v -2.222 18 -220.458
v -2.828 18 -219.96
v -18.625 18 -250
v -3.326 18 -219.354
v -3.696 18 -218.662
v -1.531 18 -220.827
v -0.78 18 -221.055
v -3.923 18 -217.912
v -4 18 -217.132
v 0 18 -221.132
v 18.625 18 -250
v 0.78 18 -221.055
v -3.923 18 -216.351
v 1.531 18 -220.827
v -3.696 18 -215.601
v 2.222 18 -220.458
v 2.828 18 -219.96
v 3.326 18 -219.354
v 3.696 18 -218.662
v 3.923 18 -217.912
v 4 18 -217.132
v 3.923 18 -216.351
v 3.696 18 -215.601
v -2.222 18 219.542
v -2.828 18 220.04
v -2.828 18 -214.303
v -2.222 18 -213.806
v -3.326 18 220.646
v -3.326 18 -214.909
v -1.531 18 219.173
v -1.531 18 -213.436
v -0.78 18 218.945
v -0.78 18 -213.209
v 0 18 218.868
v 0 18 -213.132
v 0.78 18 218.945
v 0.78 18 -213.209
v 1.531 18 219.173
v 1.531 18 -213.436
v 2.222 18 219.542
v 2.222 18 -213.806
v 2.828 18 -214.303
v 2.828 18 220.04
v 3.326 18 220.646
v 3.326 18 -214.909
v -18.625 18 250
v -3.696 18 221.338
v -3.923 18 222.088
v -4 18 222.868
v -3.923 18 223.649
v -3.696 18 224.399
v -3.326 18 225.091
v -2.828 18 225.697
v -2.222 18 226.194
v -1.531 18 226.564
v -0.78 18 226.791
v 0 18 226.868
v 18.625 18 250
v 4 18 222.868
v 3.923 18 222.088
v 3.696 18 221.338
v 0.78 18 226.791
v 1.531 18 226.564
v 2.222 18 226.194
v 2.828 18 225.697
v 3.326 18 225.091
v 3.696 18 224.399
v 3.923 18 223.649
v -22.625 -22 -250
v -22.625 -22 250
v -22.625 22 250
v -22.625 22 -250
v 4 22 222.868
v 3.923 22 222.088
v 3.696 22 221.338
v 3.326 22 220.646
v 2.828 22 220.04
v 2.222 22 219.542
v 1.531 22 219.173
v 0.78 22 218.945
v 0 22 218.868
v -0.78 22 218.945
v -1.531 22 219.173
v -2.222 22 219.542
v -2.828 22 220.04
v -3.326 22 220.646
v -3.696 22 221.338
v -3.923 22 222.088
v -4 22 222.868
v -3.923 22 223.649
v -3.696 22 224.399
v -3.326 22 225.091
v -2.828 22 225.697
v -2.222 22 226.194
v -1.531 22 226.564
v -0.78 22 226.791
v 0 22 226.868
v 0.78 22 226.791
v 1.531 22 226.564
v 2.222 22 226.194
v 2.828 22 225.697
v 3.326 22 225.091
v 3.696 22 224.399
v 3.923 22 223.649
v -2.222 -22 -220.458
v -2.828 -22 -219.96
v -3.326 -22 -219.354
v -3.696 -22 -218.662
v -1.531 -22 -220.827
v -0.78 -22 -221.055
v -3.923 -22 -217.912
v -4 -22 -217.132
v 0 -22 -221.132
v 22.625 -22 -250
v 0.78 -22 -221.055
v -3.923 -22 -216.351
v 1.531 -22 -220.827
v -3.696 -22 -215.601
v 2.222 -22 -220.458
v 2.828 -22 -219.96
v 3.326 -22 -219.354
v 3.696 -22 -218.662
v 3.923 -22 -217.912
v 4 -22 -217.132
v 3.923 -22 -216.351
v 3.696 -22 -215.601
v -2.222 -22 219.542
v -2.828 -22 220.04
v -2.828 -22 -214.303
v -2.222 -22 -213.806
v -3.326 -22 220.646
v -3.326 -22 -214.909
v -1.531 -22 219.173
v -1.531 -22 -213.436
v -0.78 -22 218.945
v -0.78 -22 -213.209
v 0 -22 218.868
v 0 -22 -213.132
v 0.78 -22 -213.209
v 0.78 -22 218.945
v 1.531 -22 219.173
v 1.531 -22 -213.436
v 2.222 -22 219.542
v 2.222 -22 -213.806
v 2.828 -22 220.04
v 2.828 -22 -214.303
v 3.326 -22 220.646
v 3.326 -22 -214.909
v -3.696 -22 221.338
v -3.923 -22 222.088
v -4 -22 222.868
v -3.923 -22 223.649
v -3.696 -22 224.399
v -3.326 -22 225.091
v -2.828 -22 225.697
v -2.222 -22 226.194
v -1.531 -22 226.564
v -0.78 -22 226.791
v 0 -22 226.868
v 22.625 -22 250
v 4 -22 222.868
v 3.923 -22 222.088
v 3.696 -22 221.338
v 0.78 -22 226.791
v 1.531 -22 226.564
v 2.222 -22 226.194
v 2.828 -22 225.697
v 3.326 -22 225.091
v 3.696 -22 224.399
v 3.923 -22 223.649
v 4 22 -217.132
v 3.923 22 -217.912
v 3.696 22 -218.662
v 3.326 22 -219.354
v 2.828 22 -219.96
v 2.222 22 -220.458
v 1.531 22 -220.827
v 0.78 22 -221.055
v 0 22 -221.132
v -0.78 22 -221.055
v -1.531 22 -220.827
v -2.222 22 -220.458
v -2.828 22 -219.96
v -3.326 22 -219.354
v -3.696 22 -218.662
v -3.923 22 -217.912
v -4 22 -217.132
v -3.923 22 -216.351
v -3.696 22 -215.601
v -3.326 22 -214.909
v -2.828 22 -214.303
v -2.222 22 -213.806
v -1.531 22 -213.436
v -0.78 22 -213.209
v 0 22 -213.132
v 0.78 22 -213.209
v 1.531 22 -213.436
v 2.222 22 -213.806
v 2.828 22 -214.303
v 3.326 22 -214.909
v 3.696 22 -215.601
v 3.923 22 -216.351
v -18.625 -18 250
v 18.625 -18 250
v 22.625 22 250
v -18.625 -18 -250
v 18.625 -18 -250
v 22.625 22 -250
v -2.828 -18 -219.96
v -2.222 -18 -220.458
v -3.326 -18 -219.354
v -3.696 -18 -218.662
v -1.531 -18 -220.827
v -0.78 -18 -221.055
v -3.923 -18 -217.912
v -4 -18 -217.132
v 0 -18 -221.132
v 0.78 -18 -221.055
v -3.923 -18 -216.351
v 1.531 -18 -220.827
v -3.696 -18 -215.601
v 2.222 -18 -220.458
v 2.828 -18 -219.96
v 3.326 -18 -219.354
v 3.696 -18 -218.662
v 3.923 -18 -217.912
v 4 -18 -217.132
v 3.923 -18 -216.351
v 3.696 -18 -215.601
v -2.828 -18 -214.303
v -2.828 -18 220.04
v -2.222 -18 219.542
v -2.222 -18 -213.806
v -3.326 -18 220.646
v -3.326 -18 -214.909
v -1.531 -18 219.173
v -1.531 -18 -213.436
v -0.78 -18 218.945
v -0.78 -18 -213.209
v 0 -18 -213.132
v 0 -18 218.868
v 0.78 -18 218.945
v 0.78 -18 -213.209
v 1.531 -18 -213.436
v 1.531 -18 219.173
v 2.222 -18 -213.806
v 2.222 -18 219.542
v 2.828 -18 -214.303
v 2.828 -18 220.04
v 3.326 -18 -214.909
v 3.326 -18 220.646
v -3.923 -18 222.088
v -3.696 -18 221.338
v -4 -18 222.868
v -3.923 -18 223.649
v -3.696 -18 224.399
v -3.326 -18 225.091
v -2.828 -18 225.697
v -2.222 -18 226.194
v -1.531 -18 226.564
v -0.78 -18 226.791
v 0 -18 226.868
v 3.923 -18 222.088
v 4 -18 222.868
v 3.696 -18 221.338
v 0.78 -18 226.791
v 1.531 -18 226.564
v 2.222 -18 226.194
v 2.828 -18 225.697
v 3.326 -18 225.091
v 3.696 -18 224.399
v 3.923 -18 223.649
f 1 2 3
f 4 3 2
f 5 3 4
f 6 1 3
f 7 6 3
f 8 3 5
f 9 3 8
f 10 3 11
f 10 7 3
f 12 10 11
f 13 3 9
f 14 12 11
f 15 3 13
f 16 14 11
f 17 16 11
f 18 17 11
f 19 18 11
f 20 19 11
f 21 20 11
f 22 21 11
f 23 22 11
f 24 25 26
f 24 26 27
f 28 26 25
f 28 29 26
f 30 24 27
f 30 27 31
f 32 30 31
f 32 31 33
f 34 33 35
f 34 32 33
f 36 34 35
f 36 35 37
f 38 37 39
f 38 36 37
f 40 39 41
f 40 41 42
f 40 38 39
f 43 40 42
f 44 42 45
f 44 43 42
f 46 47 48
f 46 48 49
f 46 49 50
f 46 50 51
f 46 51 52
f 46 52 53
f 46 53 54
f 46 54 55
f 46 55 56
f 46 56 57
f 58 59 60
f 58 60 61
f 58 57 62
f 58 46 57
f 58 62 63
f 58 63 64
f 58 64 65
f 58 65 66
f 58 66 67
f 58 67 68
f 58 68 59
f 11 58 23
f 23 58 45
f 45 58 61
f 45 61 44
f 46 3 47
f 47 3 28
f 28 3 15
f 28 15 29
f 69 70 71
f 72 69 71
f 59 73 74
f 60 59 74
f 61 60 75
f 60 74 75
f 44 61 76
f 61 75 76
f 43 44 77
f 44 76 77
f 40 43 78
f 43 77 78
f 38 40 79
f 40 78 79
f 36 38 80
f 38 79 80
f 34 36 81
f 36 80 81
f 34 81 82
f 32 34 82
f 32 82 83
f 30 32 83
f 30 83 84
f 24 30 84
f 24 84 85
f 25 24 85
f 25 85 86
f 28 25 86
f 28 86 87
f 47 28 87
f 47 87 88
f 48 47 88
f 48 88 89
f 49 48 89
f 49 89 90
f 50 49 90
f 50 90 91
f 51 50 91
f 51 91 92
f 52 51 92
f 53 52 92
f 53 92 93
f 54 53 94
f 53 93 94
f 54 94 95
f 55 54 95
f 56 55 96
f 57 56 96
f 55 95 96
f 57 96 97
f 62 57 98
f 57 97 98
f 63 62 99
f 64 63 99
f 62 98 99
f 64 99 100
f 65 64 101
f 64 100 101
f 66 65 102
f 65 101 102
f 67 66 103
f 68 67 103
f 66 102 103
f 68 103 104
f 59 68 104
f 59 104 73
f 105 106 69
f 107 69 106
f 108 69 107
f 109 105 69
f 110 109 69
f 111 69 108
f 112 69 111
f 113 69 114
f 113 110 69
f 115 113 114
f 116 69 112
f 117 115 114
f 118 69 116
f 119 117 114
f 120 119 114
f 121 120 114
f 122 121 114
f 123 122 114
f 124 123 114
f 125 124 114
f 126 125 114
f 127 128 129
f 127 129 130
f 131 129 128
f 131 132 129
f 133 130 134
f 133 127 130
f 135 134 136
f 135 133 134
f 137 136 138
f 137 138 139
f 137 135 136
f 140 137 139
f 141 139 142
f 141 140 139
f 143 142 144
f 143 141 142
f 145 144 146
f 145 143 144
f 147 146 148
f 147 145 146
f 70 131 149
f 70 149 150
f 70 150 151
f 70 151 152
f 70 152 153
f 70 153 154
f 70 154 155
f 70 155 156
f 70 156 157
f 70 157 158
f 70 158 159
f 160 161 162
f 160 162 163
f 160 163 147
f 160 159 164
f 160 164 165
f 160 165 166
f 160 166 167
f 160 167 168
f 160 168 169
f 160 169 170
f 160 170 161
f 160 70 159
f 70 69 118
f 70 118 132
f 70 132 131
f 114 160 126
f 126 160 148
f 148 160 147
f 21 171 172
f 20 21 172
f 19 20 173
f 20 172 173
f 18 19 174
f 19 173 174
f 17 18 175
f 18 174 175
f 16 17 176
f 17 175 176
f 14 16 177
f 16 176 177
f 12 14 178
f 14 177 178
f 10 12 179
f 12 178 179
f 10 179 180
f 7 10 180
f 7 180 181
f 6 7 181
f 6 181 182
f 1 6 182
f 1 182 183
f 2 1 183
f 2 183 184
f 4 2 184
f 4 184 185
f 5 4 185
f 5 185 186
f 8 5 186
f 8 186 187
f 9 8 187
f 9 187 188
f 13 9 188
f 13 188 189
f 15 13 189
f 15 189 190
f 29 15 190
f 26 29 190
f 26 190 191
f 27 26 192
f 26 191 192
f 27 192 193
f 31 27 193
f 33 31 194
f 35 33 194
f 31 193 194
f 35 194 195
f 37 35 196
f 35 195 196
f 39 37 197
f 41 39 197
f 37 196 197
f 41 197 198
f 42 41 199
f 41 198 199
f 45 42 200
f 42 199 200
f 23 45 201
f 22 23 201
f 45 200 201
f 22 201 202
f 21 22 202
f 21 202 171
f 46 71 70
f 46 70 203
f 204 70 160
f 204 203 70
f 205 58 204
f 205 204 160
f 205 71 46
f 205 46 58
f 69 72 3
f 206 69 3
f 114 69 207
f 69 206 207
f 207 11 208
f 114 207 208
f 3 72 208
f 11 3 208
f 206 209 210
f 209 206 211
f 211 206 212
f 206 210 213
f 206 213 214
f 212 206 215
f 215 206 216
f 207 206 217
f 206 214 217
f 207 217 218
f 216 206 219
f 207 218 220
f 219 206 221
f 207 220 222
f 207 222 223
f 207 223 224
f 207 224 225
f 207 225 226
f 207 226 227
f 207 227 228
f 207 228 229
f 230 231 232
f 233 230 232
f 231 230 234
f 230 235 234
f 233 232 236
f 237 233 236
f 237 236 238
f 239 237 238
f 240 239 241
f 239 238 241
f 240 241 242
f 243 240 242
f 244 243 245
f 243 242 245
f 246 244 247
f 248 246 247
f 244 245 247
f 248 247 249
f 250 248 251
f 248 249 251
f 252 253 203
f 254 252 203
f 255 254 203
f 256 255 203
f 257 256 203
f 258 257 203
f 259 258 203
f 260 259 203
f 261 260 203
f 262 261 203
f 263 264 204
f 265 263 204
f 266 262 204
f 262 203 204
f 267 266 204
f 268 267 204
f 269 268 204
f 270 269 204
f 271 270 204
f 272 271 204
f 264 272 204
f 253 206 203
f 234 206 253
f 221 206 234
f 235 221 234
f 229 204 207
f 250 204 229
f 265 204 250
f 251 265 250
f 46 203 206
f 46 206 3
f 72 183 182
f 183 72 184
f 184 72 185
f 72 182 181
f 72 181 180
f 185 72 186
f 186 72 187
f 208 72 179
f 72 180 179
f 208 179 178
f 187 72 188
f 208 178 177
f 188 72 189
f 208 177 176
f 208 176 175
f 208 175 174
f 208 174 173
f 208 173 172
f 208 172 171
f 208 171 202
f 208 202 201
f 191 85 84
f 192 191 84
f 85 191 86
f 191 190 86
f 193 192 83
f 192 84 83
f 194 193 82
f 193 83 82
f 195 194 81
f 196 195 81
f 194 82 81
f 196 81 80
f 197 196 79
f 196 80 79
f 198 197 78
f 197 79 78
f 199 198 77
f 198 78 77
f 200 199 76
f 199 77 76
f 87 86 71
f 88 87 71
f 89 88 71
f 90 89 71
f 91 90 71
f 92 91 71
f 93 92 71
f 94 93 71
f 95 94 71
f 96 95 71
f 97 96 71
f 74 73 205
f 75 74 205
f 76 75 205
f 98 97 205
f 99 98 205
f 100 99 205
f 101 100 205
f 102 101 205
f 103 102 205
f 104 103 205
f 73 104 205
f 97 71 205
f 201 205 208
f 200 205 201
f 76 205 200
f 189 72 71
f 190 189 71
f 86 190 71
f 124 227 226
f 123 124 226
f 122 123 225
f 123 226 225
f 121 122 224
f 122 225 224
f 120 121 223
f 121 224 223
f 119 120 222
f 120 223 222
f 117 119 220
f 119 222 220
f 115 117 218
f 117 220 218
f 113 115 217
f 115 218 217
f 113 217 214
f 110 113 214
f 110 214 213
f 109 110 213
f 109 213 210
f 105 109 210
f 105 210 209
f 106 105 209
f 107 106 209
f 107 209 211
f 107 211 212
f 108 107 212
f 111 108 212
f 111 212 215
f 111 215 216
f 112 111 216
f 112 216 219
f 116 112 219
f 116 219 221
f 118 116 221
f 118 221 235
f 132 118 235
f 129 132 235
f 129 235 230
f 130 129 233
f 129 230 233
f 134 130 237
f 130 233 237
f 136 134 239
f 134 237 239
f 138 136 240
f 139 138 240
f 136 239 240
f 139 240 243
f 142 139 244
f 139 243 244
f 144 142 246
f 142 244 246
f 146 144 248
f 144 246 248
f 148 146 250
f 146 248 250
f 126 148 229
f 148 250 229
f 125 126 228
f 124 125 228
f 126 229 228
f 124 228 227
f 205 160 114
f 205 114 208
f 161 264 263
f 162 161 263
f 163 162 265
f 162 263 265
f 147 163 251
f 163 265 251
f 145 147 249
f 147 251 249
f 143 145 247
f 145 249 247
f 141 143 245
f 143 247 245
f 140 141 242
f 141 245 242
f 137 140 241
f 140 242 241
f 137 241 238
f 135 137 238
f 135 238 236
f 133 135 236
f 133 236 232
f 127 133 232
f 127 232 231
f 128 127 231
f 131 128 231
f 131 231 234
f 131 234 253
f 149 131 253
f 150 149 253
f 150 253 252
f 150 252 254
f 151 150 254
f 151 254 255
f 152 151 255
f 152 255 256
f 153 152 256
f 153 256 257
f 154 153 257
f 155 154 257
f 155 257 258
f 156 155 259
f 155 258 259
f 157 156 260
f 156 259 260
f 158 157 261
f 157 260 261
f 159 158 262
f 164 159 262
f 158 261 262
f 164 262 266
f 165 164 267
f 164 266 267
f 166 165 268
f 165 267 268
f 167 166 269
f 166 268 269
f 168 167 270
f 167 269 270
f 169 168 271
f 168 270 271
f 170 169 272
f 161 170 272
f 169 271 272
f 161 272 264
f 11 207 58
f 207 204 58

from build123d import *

# Parameters (mm, degrees)
SKETCH1_W           = 45.25
SKETCH1_H           = 44
SKETCH1_W_2         = 37.25
SKETCH1_H_2         = 36
EXTRUDE_THIN1_DEPTH = 250
SKETCH2_R           = 4
CUT_EXTRUDE1_DEPTH  = 45


with BuildPart() as part:
    # Sketch1 → Extrude-Thin1 (new body, symmetric)
    with BuildSketch(Plane.XY):
        Rectangle(SKETCH1_W, SKETCH1_H)
        Rectangle(SKETCH1_W_2, SKETCH1_H_2, mode=Mode.SUBTRACT)
    extrude(amount=EXTRUDE_THIN1_DEPTH, both=True)

    # Sketch2 → Cut-Extrude1 (cut, through all)
    with BuildSketch(Plane(origin=(0, 22, 0), x_dir=(1, 0, 0), z_dir=(0, 1, 0))):
        with Locations((0, 217.131701203)):
            Circle(SKETCH2_R)
        with Locations((0, -222.868298797)):
            Circle(SKETCH2_R)
    extrude(amount=-CUT_EXTRUDE1_DEPTH, mode=Mode.SUBTRACT)


solid = part.part
